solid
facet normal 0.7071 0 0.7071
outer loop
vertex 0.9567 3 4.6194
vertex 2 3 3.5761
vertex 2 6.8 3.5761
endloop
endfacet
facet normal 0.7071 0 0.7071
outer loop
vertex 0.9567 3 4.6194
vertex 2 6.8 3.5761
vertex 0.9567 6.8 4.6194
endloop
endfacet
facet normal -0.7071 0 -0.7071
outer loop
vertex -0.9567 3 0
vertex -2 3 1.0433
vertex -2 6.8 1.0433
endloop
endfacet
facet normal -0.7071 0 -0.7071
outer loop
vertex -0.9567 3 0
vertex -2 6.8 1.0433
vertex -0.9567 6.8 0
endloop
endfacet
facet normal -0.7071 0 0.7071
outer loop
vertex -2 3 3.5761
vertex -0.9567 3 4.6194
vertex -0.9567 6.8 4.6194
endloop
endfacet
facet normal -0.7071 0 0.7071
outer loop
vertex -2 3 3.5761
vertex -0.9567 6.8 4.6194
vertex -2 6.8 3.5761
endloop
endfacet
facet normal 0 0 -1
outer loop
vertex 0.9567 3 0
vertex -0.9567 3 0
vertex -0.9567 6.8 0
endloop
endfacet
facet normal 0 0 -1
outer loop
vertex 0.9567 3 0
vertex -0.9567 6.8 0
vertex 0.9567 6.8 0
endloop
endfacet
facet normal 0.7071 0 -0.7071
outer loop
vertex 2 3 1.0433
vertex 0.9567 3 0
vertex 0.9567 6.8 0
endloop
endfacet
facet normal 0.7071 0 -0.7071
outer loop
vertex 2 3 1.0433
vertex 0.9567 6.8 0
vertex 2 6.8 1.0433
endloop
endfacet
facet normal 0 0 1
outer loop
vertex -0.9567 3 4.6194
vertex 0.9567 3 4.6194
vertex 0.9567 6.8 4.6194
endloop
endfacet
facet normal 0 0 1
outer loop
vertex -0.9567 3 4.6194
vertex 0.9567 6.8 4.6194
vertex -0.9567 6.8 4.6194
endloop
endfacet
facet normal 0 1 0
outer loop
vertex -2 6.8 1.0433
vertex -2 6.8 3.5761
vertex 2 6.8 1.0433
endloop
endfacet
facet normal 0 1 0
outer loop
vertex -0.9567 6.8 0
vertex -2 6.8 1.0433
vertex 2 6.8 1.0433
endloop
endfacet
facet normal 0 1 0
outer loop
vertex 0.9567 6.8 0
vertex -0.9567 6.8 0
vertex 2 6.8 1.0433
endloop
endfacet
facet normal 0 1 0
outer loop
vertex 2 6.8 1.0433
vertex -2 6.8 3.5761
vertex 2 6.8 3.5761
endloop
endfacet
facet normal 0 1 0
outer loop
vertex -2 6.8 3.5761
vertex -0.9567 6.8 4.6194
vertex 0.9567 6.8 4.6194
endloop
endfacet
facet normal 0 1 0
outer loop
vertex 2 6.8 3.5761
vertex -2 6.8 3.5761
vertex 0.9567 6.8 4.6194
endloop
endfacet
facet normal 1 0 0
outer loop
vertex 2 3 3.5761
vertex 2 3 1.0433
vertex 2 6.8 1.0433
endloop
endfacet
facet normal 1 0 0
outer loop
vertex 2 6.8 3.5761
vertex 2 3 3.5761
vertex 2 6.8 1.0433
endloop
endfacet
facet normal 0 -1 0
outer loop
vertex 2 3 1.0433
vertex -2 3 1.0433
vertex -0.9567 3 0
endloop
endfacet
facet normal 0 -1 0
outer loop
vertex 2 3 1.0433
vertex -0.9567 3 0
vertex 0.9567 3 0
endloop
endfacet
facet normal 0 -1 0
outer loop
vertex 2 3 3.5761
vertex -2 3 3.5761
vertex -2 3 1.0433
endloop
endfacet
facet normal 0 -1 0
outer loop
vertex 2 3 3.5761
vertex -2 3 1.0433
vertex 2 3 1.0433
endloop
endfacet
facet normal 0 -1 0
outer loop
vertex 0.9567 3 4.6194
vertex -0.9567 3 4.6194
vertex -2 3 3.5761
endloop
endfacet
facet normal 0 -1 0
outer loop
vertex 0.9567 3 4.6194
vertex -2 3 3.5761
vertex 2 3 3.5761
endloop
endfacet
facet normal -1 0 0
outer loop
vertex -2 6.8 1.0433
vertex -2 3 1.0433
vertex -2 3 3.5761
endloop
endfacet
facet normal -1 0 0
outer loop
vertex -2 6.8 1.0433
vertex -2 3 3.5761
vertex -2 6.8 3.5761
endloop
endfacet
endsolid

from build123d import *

# Parameters (mm, degrees)
BOX_W            = 4
BOX_H            = 4
BOX_DEPTH        = 10
EXTRUDE003_DEPTH = 3.8


with BuildPart() as box:
    # Box → Box (new body)
    with BuildSketch(Plane(origin=(-2, 2.8, 0), x_dir=(1, 0, 0), z_dir=(0, 0, 1))):
        with Locations((2, 2)):
            Rectangle(BOX_W, BOX_H)
    extrude(amount=BOX_DEPTH)


with BuildPart() as common:
    # Sketch002 → Extrude003 (new body)
    with BuildSketch(Plane.XZ):
        Polygon((2.309699, 1.35299), (2.309699, 3.266407), (0.956709, 4.619398), (-0.956709, 4.619398), (-2.309699, 3.266407), (-2.309699, 1.35299), (-0.956709, 0), (0.956709, 0), align=None)
    extrude(amount=-EXTRUDE003_DEPTH)


with BuildPart() as common_1:
    # Extrude003 placement: moved
    add(common.part.moved(Location((0, 3, 0))))

    # Common: intersect Box
    add(box.part, mode=Mode.INTERSECT)


solid = common_1.part
